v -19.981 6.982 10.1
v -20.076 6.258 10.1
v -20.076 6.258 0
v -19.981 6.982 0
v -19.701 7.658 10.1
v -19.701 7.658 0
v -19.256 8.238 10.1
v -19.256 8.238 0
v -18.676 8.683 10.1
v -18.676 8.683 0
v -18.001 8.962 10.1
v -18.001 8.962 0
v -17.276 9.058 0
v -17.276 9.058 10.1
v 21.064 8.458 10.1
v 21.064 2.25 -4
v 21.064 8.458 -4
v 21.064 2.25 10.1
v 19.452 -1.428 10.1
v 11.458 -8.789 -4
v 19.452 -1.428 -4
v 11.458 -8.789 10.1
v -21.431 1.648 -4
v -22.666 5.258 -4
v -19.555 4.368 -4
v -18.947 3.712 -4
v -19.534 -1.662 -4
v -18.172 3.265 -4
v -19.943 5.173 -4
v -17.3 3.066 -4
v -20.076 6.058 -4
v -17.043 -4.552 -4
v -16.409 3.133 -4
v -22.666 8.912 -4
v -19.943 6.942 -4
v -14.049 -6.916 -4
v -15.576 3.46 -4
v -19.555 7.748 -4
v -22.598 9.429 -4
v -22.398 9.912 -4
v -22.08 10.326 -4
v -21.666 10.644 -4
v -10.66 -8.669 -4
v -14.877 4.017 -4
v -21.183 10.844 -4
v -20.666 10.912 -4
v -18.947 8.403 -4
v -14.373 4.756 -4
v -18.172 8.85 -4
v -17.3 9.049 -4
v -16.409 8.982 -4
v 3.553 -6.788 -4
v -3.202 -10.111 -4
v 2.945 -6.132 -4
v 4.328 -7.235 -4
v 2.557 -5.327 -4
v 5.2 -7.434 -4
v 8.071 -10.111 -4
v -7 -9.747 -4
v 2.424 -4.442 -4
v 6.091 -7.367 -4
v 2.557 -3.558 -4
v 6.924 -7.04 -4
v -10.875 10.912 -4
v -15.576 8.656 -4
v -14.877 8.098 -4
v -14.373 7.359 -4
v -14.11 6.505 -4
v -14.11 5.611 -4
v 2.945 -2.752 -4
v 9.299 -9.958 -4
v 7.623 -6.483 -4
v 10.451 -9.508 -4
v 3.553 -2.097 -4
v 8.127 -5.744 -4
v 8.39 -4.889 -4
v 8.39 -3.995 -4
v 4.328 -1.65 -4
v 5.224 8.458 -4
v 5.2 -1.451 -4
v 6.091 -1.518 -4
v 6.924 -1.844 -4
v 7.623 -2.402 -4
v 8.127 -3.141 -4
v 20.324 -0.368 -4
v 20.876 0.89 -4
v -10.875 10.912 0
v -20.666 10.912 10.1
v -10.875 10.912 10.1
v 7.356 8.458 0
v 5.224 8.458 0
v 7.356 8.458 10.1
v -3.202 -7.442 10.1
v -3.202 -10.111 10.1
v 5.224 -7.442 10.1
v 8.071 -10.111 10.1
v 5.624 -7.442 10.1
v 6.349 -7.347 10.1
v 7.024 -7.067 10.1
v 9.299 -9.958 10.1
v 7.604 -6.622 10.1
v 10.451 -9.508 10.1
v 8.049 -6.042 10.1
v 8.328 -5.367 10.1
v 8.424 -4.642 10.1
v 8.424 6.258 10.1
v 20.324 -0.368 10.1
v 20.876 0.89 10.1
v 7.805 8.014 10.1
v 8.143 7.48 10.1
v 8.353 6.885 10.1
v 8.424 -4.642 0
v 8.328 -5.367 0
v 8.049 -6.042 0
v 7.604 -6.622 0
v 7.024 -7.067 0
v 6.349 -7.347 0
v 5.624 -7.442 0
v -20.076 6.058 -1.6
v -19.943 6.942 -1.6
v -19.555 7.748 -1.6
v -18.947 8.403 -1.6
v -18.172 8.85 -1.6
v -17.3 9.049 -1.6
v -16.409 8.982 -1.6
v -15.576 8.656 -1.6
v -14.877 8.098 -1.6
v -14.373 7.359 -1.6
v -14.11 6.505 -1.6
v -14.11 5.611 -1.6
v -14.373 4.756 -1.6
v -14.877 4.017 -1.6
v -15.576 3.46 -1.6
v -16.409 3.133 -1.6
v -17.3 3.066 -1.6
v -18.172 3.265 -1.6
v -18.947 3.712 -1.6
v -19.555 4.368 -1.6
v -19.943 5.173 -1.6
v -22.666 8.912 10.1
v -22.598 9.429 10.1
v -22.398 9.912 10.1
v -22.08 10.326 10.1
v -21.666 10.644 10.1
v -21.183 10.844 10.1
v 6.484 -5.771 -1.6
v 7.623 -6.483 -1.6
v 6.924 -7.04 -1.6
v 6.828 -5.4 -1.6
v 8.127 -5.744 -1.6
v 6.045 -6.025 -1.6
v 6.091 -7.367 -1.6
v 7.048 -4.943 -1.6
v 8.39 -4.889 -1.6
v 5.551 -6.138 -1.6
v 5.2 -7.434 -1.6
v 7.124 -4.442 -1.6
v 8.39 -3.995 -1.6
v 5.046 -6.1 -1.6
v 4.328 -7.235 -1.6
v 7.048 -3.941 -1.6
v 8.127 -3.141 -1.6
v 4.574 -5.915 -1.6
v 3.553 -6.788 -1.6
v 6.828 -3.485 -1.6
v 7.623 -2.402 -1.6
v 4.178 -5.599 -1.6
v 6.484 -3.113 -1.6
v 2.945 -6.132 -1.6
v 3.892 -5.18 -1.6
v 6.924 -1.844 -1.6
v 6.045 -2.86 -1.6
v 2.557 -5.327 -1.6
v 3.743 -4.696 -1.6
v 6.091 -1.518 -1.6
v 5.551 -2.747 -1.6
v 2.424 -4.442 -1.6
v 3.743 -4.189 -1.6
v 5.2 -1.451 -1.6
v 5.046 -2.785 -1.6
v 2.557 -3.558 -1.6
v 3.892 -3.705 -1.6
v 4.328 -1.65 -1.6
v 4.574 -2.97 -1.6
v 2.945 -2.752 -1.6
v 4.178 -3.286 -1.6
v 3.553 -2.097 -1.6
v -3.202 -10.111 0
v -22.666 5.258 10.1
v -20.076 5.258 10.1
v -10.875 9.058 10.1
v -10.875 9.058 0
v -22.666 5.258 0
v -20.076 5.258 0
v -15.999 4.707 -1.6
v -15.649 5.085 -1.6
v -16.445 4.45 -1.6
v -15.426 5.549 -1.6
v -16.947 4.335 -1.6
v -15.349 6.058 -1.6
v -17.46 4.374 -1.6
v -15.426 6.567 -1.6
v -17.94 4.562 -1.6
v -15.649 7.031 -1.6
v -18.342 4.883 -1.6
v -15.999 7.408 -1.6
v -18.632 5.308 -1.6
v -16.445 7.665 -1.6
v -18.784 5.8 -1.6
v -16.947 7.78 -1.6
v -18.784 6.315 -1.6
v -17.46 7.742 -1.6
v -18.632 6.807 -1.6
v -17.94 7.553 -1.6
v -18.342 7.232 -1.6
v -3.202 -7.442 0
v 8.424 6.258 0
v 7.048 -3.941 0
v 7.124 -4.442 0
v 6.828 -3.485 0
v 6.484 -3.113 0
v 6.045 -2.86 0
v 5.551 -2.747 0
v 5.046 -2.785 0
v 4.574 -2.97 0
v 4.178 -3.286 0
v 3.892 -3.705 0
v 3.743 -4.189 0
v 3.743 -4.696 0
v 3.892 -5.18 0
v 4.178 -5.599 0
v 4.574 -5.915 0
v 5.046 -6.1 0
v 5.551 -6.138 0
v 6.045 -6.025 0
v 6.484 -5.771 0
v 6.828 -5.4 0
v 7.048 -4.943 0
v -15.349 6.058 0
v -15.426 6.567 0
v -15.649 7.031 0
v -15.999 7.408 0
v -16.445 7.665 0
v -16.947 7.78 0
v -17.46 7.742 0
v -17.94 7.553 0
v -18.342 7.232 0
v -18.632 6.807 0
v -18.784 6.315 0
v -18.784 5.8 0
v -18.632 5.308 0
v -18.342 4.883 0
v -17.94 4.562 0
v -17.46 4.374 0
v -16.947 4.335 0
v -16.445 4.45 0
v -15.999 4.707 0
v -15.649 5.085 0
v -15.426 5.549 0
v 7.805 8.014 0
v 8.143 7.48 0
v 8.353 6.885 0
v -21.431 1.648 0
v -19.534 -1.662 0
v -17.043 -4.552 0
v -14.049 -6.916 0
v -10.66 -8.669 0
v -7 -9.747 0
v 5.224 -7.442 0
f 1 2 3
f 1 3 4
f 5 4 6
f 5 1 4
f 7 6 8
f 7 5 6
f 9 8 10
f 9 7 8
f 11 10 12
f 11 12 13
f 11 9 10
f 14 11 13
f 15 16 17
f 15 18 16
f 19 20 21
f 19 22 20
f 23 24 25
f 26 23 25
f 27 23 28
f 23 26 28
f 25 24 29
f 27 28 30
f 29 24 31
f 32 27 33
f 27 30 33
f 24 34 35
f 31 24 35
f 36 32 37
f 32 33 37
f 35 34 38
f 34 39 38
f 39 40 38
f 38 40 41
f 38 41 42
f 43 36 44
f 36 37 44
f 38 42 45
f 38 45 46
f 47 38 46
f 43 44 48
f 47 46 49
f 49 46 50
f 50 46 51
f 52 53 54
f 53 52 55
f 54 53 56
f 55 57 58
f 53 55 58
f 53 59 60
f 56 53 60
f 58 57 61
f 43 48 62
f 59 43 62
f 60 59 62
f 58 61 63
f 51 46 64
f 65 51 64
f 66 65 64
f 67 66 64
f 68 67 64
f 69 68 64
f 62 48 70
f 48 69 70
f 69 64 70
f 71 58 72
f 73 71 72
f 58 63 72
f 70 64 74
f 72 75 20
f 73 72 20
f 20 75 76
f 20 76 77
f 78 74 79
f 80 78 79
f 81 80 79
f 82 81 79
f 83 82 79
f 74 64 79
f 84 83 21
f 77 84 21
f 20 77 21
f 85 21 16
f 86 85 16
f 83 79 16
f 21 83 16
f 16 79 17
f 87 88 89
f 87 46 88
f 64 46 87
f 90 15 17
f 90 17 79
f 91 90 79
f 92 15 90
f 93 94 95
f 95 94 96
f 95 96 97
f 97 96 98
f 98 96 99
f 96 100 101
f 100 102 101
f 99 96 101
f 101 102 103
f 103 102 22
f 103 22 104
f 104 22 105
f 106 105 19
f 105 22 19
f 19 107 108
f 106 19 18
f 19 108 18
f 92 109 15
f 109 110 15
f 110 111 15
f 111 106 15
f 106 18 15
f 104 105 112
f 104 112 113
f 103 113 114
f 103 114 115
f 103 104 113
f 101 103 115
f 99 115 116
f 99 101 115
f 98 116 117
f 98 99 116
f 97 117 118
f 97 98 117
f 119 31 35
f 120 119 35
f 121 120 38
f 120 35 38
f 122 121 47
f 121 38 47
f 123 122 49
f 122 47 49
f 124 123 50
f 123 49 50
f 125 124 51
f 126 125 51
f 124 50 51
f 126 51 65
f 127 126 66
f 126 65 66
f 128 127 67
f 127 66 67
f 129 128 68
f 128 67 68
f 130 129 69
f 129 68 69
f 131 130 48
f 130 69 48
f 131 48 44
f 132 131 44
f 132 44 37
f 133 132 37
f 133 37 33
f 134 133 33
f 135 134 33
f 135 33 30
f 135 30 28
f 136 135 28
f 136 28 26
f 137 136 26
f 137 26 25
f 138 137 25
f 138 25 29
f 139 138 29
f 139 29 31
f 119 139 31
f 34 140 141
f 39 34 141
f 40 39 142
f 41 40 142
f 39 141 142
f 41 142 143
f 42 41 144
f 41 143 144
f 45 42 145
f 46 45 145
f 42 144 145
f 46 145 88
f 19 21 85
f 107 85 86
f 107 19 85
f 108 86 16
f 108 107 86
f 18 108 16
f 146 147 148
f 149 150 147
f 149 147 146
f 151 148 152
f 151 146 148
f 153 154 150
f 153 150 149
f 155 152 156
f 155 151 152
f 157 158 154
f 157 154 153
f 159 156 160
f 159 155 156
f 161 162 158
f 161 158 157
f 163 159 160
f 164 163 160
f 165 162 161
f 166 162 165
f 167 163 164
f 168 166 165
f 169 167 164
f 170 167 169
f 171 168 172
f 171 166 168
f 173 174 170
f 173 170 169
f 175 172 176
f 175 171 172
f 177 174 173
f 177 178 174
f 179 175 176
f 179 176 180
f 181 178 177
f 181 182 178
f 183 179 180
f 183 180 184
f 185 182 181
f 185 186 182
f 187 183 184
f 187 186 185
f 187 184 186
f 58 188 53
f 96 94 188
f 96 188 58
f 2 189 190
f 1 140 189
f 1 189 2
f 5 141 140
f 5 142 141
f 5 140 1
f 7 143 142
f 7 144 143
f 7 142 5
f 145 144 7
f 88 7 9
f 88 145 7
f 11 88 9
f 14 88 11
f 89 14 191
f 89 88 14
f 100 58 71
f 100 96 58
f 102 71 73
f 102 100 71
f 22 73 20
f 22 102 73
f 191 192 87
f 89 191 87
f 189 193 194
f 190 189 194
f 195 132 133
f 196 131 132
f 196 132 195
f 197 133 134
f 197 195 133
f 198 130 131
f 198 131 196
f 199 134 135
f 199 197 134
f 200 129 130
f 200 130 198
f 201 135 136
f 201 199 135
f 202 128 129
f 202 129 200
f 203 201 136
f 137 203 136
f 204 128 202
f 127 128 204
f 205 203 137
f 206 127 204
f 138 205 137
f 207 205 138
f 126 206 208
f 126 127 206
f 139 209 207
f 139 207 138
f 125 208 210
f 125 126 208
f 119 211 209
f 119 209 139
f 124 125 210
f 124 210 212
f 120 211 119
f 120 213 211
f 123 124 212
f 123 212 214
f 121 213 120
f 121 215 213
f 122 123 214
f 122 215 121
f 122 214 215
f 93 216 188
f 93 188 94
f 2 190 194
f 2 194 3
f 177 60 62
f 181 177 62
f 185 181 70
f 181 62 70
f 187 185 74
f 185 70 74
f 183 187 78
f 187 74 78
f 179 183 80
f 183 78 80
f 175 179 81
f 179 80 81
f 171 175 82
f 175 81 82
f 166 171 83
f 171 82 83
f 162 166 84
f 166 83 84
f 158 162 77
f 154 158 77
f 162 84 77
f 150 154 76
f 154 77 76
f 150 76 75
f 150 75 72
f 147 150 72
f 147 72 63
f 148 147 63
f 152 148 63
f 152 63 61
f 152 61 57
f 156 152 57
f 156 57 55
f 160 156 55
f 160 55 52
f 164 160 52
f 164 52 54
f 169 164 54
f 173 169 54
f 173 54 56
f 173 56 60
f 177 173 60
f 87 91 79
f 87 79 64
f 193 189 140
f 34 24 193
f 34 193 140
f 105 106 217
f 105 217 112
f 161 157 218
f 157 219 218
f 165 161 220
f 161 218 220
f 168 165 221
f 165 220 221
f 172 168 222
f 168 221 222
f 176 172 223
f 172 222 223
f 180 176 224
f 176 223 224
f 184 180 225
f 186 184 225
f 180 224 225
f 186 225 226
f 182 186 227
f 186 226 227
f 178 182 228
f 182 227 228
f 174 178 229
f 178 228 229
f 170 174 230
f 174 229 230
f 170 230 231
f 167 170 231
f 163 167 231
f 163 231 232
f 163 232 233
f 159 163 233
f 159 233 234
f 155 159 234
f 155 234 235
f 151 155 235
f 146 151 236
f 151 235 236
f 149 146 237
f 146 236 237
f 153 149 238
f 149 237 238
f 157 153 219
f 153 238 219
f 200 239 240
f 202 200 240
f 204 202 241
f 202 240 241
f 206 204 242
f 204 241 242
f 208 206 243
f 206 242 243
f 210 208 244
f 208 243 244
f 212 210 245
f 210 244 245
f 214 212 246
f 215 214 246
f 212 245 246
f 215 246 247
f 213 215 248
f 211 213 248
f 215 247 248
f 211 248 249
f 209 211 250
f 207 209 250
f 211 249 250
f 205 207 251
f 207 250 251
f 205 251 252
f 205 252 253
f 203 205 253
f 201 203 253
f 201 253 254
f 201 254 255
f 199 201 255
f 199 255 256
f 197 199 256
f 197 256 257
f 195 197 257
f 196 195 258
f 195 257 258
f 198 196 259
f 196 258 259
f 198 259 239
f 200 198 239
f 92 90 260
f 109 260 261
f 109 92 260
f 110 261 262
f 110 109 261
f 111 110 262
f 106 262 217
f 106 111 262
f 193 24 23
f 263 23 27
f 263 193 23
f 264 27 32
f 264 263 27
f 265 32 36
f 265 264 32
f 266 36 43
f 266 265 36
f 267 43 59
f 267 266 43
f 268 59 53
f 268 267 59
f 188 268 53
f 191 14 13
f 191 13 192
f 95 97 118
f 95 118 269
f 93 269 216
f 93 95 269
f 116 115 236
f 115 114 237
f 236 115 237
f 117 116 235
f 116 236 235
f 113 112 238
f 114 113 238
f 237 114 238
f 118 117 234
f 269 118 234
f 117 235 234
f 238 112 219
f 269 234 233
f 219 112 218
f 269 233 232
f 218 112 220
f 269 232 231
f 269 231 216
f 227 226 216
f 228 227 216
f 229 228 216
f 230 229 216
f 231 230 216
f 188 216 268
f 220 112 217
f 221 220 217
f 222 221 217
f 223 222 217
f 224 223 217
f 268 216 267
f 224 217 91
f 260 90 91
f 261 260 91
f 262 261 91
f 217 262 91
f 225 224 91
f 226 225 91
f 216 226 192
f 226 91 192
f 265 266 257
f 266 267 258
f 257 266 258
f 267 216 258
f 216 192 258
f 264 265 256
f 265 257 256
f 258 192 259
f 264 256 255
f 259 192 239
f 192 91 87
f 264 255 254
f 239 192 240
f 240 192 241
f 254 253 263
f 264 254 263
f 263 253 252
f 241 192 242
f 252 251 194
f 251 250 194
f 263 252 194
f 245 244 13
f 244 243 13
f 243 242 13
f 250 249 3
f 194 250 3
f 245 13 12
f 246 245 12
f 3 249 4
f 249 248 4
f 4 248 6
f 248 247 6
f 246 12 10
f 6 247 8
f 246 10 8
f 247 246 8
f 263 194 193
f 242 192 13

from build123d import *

# Parameters (mm, degrees)
BOSS_EXTRUDE1_DEPTH                                 = 10.1
SKETCH2_W                                           = 10.1
SKETCH2_H                                           = 2.668782353
BOSS_EXTRUDE2_DEPTH                                 = 11.626285019
BOSS_EXTRUDE3_DEPTH                                 = 4
SKETCH4_W                                           = 11.790327601
SKETCH4_H                                           = 5.654182735
BOSS_EXTRUDE4_DEPTH                                 = 10.1
CUT_EXTRUDE1_REACH                                  = 32.993
SKETCH6_W                                           = 5.300644637
SKETCH6_H                                           = 10.1
CBORE_FOR_4_BINDING_HEAD_MACHINE_SCREW1_D           = 3.4
CBORE_FOR_4_BINDING_HEAD_MACHINE_SCREW1_CBORE_D     = 6
CBORE_FOR_4_BINDING_HEAD_MACHINE_SCREW1_CBORE_DEPTH = 2.4
CBORE_FOR_4_BINDING_HEAD_MACHINE_SCREW2_D           = 3.4544
CBORE_FOR_4_BINDING_HEAD_MACHINE_SCREW2_CBORE_D     = 5.999999938
CBORE_FOR_4_BINDING_HEAD_MACHINE_SCREW2_CBORE_DEPTH = 2.400000026
FILLET1_R                                           = 2
FILLET2_R                                           = 3.2
FILLET3_R                                           = 5
CUT_EXTRUDE2_DEPTH                                  = 10.1


with BuildPart() as part:
    # Sketch1 → Boss-Extrude1 (new body)
    with BuildSketch(Plane.XY.offset(10.1)):
        with BuildLine():
            Line((8.423890913, 5.257630162), (8.423890913, -10.111152191))
            Line((8.423890913, -10.111152191), (10.022735266, -10.111152191))
            Line((10.022735266, -10.111152191), (21.064470639, 0.057225582))
            Line((21.064470639, 0.057225582), (21.064470639, 8.457630162))
            Line((21.064470639, 8.457630162), (5.223890913, 8.457630162))
            ThreePointArc((5.223890913, 8.457630162), (7.486632612, 7.520371862), (8.423890913, 5.257630162))
        make_face()
    extrude(amount=-BOSS_EXTRUDE1_DEPTH)

    # Sketch2 → Boss-Extrude2 (add)
    with BuildSketch(Plane.ZY.offset(-8.423890913)):
        with Locations((5.05, -8.776761014)):
            Rectangle(SKETCH2_W, SKETCH2_H)
    extrude(amount=BOSS_EXTRUDE2_DEPTH)

    # Sketch3 → Boss-Extrude3 (add)
    with BuildSketch(Plane(origin=(0, 0, 0), x_dir=(-1, 0, 0), z_dir=(0, 0, -1))):
        with BuildLine():
            Line((3.202394106, -10.111152191), (-10.022735266, -10.111152191))
            Line((-10.022735266, -10.111152191), (-21.064470639, 0.057225582))
            Line((-21.064470639, 0.057225582), (-21.064470639, 8.457630162))
            Line((-21.064470639, 8.457630162), (-5.223890913, 8.457630162))
            Line((-5.223890913, 8.457630162), (10.87546445, 10.911812897))
            Line((10.87546445, 10.911812897), (22.665792051, 10.911812897))
            Line((22.665792051, 10.911812897), (22.665792051, 5.257630162))
            ThreePointArc((22.665792051, 5.257630162), (15.602226067, -5.805749207), (3.202394106, -10.111152191))
        make_face()
    extrude(amount=BOSS_EXTRUDE3_DEPTH)

    # Sketch4 → Boss-Extrude4 (add)
    with BuildSketch(Plane.XY):
        with Locations((-16.77062825, 8.08472153)):
            Rectangle(SKETCH4_W, SKETCH4_H)
    extrude(amount=BOSS_EXTRUDE4_DEPTH)

    # Sketch6 → Cut-Extrude1 (cut, up to next)
    with BuildSketch(Plane(origin=(0, 8.457630162, 0), x_dir=(1, 0, 0), z_dir=(0, 1, 0)), mode=Mode.PRIVATE) as cut_extrude1_sk1:
        with Locations((-13.525786769, -5.05)):
            Rectangle(SKETCH6_W, SKETCH6_H)
    cut_extrude1_tool1 = extrude(cut_extrude1_sk1.sketch, amount=-CUT_EXTRUDE1_REACH, mode=Mode.PRIVATE) & part.part
    add(cut_extrude1_tool1.solids().sort_by_distance((-13.525787, 8.45763, 5.05))[0], mode=Mode.SUBTRACT)

    # CBORE for #4 Binding Head Machine Screw1 (through all)
    with Locations(Plane(origin=(0, 0, -4), x_dir=(-1, 0, 0), z_dir=(0, 0, -1))):
        with Locations((-5.423890913, -4.442369838)):
            CounterBoreHole(CBORE_FOR_4_BINDING_HEAD_MACHINE_SCREW1_D / 2, CBORE_FOR_4_BINDING_HEAD_MACHINE_SCREW1_CBORE_D / 2, CBORE_FOR_4_BINDING_HEAD_MACHINE_SCREW1_CBORE_DEPTH)

    # CBORE for #4 Binding Head Machine Screw2 (through all)
    with Locations(Plane(origin=(0, 0, -4), x_dir=(-1, 0, 0), z_dir=(0, 0, -1))):
        with Locations((17.076109087, 6.057630162)):
            CounterBoreHole(CBORE_FOR_4_BINDING_HEAD_MACHINE_SCREW2_D / 2, CBORE_FOR_4_BINDING_HEAD_MACHINE_SCREW2_CBORE_D / 2, CBORE_FOR_4_BINDING_HEAD_MACHINE_SCREW2_CBORE_DEPTH)

    # Fillet1
    fillet1_edges = [part.edges().sort_by_distance(p)[0] for p in [
        (-22.665792051, 10.911812897, 3.05),
    ]]
    fillet(fillet1_edges, radius=FILLET1_R)

    # Fillet2
    fillet2_edges = [part.edges().sort_by_distance(p)[0] for p in [
        (8.423890913, -7.442369838, 5.05),
    ]]
    fillet(fillet2_edges, radius=FILLET2_R)

    # Fillet3
    fillet3_edges = [part.edges().sort_by_distance(p)[0] for p in [
        (21.064470639, 0.057225582, 3.05),
        (10.022735266, -10.111152191, 3.05),
    ]]
    fillet(fillet3_edges, radius=FILLET3_R)

    # Sketch11 → Cut-Extrude2 (cut)
    with BuildSketch(Plane.XY.offset(10.1)):
        with BuildLine():
            Line((5.623890913, -7.442369838), (-20.076109087, -7.442369838))
            Line((-20.076109087, -7.442369838), (-20.076109087, 6.257630162))
            ThreePointArc((-20.076109087, 6.257630162), (-19.256008075, 8.23752915), (-17.276109087, 9.057630162))
            Line((-17.276109087, 9.057630162), (5.623890913, 9.057630162))
            ThreePointArc((5.623890913, 9.057630162), (7.6037899, 8.23752915), (8.423890913, 6.257630162))
            Line((8.423890913, 6.257630162), (8.423890913, -4.642369838))
            ThreePointArc((8.423890913, -4.642369838), (7.6037899, -6.622268825), (5.623890913, -7.442369838))
        make_face()
    extrude(amount=-CUT_EXTRUDE2_DEPTH, mode=Mode.SUBTRACT)


solid = part.part
